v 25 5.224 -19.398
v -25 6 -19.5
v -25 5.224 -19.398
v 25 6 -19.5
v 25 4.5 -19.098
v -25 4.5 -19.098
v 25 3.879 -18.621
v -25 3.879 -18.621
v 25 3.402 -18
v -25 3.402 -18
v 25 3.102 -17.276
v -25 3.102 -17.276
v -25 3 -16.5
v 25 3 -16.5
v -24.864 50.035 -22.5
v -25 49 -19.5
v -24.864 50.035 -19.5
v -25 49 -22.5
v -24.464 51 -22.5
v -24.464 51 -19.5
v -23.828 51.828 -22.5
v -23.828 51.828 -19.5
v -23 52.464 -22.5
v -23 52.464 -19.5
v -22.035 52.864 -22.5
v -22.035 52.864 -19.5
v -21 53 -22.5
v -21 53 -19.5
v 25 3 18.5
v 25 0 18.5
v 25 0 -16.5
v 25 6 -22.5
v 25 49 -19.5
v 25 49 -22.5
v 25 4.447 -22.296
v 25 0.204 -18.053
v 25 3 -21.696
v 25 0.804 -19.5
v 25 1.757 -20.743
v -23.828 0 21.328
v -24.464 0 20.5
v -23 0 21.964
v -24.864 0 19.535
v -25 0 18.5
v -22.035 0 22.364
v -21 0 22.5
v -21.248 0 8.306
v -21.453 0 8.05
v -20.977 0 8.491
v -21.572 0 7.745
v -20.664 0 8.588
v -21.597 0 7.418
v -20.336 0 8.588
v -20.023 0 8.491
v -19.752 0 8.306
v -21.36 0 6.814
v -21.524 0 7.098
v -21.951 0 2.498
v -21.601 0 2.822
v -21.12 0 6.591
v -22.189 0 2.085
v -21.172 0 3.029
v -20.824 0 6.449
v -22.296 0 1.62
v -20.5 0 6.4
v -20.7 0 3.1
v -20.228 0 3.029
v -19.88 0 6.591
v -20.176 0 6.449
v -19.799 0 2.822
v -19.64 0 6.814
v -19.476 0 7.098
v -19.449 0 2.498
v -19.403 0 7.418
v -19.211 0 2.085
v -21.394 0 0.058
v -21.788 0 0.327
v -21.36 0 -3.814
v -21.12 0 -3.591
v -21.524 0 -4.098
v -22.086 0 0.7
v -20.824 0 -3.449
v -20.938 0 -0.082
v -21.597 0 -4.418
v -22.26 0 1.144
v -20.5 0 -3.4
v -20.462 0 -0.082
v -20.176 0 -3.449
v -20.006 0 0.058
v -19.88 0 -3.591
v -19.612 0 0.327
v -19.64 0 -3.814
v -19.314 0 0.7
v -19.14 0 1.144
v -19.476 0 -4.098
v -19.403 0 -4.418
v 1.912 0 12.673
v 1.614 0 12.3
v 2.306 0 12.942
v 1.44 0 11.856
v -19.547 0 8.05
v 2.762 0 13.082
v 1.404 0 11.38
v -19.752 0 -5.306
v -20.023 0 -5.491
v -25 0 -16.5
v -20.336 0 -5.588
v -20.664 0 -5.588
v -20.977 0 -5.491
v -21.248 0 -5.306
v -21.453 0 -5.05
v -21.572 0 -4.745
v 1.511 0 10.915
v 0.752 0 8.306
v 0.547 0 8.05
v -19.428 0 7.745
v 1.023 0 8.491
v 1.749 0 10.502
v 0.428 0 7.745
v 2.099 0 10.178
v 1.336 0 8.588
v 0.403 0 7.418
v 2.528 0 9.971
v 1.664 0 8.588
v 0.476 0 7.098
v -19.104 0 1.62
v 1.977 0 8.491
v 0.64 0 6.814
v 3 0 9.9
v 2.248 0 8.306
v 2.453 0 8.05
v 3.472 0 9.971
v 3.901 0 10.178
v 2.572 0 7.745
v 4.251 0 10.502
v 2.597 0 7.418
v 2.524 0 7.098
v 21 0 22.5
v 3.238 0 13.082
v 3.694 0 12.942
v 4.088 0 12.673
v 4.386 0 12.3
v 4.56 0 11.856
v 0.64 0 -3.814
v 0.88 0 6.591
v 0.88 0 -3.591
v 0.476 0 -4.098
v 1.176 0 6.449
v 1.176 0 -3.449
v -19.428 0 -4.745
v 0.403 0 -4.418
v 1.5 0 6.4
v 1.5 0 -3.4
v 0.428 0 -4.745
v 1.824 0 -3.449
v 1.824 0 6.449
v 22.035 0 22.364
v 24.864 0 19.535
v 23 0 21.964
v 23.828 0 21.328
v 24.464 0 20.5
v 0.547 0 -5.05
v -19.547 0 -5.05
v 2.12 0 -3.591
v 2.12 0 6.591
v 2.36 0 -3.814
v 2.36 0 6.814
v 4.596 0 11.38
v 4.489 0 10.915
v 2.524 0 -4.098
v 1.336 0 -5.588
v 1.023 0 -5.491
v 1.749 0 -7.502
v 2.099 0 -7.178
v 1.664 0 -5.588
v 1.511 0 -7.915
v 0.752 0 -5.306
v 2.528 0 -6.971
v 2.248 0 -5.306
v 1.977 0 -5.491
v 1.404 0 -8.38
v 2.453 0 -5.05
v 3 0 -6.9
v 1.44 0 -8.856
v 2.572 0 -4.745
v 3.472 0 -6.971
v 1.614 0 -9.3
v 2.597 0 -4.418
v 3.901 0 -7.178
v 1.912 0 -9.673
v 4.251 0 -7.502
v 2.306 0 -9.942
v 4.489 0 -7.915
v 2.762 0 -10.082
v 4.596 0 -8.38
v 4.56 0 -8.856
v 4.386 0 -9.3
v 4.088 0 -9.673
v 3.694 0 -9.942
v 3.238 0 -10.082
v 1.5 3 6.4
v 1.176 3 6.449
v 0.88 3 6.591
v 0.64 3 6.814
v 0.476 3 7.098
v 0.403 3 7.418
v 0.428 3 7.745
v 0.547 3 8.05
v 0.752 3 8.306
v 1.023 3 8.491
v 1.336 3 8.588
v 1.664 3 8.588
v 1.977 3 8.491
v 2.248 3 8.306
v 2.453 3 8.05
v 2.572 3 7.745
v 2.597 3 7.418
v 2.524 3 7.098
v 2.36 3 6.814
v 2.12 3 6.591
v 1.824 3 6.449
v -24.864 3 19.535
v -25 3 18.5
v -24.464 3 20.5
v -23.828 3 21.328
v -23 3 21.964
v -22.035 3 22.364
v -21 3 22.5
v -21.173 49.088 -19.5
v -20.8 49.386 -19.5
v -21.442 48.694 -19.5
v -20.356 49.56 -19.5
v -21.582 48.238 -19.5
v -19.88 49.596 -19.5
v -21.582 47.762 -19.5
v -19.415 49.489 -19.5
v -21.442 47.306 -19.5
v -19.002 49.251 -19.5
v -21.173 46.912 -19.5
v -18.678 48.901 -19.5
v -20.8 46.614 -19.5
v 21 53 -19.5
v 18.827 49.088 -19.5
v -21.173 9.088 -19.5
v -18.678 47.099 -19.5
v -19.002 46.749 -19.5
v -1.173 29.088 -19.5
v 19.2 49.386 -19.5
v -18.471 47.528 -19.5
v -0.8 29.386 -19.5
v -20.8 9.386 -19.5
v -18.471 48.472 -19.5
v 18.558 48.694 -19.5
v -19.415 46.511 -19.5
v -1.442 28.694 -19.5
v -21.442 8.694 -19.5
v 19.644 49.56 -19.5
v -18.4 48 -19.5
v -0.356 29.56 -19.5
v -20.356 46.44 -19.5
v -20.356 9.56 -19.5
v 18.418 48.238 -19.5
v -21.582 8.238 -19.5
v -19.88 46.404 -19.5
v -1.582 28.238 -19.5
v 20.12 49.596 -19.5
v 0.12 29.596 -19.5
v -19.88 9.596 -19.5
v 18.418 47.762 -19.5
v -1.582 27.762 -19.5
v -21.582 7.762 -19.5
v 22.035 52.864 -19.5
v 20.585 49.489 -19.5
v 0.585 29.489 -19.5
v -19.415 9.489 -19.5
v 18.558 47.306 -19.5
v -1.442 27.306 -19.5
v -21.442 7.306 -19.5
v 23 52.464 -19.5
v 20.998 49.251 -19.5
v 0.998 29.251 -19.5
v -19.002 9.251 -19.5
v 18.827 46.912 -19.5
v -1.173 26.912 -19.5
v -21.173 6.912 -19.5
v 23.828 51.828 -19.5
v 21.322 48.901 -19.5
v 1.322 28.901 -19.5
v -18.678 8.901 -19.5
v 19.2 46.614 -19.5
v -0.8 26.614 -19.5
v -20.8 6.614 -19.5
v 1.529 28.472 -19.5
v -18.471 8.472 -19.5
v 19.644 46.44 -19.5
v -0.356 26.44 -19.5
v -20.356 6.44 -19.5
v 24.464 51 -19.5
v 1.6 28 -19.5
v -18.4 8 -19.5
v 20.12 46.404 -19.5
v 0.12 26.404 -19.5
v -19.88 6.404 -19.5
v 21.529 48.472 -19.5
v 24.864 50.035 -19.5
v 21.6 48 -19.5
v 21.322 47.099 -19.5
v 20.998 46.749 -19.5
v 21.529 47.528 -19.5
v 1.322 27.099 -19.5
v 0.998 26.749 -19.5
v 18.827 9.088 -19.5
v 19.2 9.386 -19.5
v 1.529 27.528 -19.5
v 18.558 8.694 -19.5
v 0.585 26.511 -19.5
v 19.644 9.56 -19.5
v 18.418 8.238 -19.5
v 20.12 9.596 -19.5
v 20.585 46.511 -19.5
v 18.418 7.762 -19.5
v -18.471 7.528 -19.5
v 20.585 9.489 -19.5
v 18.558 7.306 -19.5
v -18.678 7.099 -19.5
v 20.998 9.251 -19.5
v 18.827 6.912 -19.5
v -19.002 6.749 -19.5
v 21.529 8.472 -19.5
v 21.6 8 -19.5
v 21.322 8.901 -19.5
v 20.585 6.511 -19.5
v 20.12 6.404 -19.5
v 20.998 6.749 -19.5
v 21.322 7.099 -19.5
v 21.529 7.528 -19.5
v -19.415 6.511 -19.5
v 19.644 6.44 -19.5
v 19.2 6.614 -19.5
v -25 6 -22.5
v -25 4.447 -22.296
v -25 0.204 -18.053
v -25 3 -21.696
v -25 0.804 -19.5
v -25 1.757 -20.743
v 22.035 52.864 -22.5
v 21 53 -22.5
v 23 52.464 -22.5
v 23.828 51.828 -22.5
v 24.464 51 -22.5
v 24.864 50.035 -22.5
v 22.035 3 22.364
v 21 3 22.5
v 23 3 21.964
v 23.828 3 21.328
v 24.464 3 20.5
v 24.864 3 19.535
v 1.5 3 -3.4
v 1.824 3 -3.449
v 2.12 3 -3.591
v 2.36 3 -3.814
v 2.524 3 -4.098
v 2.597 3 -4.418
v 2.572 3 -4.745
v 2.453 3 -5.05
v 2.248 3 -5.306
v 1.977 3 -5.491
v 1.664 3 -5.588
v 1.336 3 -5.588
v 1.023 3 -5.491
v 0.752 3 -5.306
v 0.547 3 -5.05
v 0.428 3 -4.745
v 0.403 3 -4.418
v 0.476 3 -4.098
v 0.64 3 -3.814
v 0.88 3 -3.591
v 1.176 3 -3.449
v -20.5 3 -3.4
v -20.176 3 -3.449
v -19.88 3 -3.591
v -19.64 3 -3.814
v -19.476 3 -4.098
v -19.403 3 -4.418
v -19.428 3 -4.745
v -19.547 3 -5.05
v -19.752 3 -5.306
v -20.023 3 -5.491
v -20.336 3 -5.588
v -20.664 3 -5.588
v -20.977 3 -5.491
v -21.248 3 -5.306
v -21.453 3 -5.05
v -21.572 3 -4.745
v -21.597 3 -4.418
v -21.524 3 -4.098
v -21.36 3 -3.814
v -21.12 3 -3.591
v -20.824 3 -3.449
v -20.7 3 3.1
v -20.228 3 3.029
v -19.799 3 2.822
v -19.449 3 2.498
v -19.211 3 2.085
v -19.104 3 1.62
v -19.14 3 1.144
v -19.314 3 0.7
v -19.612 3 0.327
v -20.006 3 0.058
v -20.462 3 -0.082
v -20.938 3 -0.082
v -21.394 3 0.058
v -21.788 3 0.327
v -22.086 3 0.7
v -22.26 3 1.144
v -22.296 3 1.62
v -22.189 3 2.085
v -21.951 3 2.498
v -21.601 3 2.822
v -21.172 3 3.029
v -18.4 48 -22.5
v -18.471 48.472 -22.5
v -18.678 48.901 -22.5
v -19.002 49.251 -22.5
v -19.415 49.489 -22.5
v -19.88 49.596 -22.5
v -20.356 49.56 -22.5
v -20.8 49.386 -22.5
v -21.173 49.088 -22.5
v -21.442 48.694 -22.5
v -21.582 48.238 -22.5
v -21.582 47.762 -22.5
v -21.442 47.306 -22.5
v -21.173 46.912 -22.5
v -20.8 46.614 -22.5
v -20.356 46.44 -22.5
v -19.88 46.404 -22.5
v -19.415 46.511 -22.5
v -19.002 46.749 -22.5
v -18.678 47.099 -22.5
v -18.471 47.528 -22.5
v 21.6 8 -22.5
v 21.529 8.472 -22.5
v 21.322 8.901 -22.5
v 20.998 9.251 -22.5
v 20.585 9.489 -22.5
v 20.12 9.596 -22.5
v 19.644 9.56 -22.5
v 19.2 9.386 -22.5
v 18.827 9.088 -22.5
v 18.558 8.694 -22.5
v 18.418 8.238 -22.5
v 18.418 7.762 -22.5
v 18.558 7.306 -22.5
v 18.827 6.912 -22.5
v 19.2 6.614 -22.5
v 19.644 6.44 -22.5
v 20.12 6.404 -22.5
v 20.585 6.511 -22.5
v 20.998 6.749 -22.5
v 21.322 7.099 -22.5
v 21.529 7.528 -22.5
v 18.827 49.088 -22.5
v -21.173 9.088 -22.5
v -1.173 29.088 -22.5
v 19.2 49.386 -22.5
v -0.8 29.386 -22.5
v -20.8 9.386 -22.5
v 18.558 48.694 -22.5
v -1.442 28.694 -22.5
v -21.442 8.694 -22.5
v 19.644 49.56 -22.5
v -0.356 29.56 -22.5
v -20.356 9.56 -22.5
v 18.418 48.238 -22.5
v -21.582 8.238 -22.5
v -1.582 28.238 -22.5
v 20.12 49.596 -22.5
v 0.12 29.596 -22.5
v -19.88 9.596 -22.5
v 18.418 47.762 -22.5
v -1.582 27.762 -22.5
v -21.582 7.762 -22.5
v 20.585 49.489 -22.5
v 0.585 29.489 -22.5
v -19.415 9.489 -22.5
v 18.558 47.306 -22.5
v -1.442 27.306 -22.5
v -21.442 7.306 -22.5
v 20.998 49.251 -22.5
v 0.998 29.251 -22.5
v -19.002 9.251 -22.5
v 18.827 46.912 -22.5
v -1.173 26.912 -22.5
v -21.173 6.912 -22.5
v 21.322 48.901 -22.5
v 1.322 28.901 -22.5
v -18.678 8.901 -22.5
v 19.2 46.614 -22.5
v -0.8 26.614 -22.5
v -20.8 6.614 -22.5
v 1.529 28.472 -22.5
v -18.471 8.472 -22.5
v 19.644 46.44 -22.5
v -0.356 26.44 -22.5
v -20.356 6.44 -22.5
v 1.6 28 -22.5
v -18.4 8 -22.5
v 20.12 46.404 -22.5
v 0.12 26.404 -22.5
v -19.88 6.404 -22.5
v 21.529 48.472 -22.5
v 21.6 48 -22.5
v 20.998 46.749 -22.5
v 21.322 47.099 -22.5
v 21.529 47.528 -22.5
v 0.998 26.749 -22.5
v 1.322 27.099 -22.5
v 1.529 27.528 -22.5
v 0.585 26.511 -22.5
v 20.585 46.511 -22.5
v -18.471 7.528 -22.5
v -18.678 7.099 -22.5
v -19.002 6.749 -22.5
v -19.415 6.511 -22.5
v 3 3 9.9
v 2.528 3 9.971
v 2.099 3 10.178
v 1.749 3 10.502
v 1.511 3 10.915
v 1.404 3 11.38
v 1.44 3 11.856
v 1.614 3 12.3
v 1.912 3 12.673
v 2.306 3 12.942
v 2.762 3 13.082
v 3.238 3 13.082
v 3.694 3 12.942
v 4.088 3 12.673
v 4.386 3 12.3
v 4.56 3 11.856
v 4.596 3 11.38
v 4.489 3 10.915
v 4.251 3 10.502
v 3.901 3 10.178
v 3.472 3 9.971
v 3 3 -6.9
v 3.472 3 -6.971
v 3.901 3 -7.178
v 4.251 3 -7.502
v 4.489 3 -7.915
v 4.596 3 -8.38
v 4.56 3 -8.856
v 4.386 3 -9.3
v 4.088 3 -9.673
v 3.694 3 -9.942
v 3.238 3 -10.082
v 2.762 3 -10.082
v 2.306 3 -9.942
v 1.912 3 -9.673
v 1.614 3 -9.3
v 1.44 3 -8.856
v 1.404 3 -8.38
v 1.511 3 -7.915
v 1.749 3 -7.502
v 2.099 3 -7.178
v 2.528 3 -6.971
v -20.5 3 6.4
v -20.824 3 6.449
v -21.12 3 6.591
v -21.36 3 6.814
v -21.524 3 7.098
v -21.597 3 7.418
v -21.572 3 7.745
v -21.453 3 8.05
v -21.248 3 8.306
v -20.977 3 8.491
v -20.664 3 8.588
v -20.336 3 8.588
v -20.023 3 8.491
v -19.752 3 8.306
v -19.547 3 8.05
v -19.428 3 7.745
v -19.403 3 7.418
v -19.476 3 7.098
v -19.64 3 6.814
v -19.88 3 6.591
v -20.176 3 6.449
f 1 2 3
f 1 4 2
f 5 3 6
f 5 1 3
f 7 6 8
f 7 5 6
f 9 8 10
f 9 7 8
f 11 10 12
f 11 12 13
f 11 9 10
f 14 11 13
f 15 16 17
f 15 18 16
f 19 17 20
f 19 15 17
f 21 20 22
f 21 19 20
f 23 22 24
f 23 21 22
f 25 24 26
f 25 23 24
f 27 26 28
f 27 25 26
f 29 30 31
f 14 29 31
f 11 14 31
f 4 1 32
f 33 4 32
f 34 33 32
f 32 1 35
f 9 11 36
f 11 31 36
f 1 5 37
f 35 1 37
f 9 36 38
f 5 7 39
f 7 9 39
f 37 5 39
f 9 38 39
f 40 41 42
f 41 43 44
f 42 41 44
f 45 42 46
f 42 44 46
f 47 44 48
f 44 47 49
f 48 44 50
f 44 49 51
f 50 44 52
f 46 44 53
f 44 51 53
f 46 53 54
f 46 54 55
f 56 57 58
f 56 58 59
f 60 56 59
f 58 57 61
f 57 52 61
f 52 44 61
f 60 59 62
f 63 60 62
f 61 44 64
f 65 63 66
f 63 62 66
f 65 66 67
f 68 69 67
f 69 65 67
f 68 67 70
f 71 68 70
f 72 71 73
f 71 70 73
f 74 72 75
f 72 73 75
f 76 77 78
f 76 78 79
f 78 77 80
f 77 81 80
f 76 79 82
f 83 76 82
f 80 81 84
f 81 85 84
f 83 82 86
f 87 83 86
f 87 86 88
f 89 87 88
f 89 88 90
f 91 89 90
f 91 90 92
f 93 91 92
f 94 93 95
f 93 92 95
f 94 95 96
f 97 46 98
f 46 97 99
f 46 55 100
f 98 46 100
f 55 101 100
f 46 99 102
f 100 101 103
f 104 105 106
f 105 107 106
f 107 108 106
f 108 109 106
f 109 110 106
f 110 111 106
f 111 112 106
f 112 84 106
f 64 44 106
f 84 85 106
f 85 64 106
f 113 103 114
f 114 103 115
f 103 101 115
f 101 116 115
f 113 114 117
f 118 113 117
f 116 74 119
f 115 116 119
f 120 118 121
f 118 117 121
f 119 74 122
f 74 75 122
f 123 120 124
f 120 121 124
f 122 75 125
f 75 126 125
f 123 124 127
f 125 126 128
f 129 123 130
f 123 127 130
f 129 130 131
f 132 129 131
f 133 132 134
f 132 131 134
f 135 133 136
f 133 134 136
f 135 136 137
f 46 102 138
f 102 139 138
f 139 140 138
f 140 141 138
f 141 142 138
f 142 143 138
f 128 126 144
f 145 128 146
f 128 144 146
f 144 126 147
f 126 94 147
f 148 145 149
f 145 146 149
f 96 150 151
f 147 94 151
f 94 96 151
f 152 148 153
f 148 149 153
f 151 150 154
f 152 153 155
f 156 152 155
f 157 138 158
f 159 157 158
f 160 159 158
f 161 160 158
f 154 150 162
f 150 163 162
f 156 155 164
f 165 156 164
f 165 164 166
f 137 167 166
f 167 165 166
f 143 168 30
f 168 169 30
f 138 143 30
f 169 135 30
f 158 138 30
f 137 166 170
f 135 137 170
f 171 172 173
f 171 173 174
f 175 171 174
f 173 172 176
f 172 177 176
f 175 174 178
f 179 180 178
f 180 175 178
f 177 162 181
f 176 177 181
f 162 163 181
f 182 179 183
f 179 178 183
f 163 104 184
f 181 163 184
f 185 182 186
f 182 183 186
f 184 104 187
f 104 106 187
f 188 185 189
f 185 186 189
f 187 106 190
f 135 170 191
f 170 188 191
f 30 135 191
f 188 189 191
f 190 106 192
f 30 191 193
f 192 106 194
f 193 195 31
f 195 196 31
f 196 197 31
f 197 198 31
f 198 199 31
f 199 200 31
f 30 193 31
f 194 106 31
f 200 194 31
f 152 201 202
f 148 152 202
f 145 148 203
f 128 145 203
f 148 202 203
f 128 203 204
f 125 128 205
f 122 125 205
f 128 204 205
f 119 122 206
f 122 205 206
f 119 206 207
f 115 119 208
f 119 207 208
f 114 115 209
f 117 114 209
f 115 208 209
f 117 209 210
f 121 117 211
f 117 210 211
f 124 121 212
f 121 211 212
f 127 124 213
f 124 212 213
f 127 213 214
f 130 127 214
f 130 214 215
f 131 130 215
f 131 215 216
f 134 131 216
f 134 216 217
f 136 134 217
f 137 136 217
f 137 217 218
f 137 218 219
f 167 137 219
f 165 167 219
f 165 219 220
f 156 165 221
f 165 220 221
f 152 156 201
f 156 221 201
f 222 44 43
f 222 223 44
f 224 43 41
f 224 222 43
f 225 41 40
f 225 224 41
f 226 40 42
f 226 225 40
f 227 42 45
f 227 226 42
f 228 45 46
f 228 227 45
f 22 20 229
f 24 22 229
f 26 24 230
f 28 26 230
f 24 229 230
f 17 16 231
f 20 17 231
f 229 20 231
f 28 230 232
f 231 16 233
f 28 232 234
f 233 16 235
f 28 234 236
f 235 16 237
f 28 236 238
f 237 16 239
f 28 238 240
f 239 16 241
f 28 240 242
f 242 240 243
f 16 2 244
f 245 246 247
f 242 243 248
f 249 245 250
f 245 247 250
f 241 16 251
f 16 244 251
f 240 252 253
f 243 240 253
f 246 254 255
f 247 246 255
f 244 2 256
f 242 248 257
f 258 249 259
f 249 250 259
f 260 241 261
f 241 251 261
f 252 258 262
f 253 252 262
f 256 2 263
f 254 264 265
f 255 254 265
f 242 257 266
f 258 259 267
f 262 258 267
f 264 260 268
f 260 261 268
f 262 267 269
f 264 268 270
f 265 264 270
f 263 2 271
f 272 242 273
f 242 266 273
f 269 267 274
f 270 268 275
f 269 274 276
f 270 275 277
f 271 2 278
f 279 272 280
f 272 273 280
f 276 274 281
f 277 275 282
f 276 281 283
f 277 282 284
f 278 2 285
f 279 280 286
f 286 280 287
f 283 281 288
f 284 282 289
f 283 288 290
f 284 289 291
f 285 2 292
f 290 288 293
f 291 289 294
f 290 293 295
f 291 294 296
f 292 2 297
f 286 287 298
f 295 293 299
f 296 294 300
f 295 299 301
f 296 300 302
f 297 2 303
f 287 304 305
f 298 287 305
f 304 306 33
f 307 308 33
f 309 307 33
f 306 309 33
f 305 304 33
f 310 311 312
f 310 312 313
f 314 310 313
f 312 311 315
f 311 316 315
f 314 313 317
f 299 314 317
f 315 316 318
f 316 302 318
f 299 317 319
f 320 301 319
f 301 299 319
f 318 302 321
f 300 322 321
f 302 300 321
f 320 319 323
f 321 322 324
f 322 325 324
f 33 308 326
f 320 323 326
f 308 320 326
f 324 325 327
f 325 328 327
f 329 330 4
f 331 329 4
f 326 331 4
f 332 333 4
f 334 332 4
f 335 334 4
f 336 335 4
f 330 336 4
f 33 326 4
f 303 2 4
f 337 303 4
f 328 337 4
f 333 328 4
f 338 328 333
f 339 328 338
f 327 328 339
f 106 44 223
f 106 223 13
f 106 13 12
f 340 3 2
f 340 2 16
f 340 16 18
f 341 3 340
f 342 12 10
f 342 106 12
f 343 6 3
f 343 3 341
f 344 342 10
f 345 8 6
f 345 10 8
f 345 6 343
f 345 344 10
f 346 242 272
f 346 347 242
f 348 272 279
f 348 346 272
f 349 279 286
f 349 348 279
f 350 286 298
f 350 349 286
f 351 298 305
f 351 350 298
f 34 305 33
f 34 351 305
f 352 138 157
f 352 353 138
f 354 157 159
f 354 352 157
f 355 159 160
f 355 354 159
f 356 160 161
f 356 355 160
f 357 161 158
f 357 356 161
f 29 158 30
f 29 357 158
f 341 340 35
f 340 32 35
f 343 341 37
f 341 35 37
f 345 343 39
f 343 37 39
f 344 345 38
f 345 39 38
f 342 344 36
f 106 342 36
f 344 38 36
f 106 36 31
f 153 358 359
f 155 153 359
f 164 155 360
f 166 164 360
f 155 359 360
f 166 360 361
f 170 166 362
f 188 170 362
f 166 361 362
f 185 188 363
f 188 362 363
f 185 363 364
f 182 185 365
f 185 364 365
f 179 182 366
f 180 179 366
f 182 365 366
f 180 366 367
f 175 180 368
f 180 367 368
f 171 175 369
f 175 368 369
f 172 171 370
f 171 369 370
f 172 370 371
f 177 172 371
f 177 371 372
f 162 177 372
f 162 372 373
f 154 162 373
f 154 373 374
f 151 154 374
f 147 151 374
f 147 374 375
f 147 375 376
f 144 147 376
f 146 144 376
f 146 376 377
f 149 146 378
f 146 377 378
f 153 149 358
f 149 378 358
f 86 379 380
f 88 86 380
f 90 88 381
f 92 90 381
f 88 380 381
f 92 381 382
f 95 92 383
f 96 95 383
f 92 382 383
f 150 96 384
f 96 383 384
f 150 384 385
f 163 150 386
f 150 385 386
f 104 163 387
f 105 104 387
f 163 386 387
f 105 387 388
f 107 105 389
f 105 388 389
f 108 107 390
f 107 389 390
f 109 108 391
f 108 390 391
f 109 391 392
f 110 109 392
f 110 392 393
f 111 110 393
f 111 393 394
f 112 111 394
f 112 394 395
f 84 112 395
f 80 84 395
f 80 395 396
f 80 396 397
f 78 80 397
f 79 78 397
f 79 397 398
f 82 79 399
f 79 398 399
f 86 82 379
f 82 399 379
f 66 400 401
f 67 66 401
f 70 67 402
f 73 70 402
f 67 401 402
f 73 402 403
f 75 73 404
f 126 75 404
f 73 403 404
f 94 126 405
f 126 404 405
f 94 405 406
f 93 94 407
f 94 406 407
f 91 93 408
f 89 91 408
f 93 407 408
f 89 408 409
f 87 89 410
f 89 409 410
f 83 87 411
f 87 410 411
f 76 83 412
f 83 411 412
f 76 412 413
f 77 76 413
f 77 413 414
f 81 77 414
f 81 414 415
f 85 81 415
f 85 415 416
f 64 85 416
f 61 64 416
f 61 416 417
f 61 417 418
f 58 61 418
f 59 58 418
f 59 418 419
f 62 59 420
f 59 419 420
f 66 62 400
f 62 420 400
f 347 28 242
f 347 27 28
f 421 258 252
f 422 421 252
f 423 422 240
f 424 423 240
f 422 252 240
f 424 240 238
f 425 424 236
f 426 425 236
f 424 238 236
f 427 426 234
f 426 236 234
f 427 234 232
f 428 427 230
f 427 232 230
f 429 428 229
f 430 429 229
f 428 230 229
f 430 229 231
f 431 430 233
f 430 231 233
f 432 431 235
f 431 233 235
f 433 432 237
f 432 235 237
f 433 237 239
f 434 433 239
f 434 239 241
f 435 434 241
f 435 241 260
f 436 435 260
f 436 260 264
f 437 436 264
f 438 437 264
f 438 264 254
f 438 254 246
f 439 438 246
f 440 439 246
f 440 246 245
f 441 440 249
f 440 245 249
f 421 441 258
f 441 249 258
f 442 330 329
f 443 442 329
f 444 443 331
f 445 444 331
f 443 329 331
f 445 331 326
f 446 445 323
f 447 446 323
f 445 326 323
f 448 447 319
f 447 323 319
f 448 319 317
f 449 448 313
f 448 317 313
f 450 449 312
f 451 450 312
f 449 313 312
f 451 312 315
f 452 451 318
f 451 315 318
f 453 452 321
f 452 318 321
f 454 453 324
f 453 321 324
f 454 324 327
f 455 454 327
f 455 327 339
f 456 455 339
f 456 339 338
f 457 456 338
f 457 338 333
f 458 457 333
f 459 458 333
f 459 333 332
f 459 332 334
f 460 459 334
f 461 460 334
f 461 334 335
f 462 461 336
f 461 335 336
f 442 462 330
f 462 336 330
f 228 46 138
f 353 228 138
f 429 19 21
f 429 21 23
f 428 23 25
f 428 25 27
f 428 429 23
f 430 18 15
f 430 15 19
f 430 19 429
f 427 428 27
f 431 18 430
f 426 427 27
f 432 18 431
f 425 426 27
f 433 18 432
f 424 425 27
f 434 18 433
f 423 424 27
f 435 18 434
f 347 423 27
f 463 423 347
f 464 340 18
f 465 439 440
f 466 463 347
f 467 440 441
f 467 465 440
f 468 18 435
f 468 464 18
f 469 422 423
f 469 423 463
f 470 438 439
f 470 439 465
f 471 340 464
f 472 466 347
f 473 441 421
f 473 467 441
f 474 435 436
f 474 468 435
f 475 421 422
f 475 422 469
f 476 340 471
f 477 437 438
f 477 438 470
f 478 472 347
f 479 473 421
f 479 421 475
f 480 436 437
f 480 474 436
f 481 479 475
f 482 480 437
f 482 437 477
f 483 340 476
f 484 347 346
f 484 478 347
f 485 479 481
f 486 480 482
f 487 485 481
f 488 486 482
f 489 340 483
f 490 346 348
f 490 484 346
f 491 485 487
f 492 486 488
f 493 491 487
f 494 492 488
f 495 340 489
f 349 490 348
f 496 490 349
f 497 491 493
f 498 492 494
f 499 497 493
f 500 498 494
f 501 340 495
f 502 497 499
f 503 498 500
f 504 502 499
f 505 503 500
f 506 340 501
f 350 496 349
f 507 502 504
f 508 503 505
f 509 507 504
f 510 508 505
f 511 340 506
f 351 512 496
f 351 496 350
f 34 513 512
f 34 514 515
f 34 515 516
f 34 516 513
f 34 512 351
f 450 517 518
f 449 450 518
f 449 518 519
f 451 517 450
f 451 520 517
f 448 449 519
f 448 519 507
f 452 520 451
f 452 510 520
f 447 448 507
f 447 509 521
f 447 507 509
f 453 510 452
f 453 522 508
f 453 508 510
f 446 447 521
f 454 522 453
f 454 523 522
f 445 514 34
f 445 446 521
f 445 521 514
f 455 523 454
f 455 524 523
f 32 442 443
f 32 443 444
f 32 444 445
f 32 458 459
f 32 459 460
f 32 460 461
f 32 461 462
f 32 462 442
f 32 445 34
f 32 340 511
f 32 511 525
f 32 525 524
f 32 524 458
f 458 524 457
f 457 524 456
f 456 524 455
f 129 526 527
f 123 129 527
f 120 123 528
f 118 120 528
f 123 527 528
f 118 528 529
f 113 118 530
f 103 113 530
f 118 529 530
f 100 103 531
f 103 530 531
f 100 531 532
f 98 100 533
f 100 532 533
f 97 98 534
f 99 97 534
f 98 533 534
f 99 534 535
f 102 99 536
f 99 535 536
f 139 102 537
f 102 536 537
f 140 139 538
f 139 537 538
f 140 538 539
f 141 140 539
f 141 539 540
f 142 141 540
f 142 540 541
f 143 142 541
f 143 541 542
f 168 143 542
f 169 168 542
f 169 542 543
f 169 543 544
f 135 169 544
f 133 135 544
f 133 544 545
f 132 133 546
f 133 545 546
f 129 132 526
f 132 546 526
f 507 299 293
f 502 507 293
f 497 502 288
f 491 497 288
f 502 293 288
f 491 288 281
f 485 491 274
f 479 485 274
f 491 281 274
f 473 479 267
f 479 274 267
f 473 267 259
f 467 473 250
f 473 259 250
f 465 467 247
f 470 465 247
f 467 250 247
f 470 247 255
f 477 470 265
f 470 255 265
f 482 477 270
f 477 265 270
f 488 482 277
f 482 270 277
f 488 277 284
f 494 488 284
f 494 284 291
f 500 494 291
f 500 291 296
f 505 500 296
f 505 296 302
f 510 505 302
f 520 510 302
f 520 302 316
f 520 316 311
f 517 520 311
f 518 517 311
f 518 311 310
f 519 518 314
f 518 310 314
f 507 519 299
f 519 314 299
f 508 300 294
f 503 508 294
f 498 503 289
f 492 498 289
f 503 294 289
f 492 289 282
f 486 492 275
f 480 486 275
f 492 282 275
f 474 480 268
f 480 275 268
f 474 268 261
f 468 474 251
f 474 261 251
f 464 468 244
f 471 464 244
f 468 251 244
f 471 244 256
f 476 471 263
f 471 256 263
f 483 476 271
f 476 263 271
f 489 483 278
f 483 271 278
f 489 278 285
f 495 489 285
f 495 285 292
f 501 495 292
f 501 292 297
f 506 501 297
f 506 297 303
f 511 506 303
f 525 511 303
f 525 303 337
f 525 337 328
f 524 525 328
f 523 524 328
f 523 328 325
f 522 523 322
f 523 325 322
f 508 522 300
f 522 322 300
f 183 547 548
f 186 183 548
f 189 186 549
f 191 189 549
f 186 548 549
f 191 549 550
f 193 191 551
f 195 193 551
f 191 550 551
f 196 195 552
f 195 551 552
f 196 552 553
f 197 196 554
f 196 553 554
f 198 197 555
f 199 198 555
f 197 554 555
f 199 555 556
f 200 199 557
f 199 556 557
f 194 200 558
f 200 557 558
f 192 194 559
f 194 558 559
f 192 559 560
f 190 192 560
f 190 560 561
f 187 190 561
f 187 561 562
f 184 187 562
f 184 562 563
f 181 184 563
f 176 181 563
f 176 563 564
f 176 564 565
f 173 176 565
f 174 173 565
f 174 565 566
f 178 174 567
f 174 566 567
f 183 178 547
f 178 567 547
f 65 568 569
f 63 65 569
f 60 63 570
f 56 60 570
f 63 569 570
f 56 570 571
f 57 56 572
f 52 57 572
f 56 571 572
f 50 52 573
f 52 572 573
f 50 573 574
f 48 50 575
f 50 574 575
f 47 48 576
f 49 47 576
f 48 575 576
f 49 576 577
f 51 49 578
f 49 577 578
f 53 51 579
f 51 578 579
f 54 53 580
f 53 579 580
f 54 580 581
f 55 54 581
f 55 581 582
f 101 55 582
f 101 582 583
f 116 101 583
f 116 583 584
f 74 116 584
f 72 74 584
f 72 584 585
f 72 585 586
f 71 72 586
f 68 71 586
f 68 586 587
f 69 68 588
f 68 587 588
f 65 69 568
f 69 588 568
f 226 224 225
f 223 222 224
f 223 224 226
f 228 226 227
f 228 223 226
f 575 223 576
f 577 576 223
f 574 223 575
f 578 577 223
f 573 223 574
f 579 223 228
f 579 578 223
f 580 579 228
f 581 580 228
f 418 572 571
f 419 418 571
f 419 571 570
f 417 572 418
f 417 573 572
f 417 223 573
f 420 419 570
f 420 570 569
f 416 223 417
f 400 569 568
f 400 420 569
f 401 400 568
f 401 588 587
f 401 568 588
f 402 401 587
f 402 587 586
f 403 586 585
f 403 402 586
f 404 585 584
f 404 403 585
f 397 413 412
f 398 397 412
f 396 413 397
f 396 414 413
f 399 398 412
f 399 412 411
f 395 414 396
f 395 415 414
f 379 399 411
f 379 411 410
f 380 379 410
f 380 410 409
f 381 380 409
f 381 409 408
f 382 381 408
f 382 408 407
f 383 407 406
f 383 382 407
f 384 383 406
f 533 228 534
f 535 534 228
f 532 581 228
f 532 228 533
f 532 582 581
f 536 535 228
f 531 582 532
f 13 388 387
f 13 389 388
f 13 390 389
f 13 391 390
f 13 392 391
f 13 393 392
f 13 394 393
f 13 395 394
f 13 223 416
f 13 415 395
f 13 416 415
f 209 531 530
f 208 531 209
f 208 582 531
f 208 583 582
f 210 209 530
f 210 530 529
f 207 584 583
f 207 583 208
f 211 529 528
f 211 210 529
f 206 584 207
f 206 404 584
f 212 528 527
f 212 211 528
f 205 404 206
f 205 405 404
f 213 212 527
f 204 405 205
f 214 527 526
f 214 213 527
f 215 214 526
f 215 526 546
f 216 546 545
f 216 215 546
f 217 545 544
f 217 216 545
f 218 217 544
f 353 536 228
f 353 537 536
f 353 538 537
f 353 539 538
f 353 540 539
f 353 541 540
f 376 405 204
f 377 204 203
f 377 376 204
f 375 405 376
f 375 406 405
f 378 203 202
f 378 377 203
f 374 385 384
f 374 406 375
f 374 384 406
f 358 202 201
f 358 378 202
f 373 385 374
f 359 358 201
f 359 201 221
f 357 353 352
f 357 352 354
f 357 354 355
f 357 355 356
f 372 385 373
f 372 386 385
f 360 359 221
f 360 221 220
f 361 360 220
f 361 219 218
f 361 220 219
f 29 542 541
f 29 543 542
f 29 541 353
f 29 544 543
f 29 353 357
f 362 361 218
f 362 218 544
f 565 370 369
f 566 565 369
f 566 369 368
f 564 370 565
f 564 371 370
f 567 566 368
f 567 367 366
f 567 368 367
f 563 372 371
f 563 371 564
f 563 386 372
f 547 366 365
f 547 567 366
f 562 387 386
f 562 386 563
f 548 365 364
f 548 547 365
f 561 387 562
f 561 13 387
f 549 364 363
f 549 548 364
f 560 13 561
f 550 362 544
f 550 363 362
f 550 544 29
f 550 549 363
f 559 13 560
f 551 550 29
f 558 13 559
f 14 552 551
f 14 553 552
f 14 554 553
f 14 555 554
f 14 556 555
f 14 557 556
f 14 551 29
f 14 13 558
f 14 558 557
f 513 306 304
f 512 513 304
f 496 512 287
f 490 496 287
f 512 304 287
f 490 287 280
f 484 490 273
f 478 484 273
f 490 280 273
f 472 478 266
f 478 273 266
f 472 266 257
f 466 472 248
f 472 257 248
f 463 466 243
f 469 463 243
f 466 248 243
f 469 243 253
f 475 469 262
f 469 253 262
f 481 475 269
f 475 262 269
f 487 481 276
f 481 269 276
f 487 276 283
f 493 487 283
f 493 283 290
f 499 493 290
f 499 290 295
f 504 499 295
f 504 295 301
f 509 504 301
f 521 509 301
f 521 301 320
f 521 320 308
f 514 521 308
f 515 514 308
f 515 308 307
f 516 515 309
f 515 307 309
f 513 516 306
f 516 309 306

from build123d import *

# Parameters (mm, degrees)
SKETCH1_W           = 50
SKETCH1_H           = 45
BOSS_EXTRUDE1_DEPTH = 3
SKETCH2_W           = 50
SKETCH2_H           = 3
BOSS_EXTRUDE2_DEPTH = 50
SKETCH3_R           = 1.6
SKETCH3_R_2         = 1.1
CUT_EXTRUDE1_DEPTH  = 3
SKETCH4_R           = 1.6
CUT_EXTRUDE2_DEPTH  = 3
FILLET1_R           = 4
FILLET2_R           = 3
FILLET3_R           = 6


with BuildPart() as part:
    # Sketch1 → Boss-Extrude1 (new body)
    with BuildSketch(Plane(origin=(0, 0, 0), x_dir=(1, 0, 0), z_dir=(0, 1, 0))):
        Rectangle(SKETCH1_W, SKETCH1_H)
    extrude(amount=BOSS_EXTRUDE1_DEPTH)

    # Sketch2 → Boss-Extrude2 (add)
    with BuildSketch(Plane(origin=(0, 3, 0), x_dir=(1, 0, 0), z_dir=(0, 1, 0))):
        with Locations((0, 21)):
            Rectangle(SKETCH2_W, SKETCH2_H)
    extrude(amount=BOSS_EXTRUDE2_DEPTH)

    # Sketch3 → Cut-Extrude1 (cut)
    with BuildSketch(Plane(origin=(0, 3, 0), x_dir=(1, 0, 0), z_dir=(0, 1, 0))):
        with Locations(Location((3, 8.5, 0), (0, 0, 270))):
            Circle(SKETCH3_R)
        with Locations(Location((3, -11.5, 0), (0, 0, 90))):
            Circle(SKETCH3_R)
        with Locations(Location((-20.7, -1.5, 0), (0, 0, 270))):
            Circle(SKETCH3_R)
        with Locations(Location((1.5, 4.5, 0), (0, 0, 270))):
            Circle(SKETCH3_R_2)
        with Locations(Location((1.5, -7.5, 0), (0, 0, 90))):
            Circle(SKETCH3_R_2)
        with Locations(Location((-20.5, 4.5, 0), (0, 0, 270))):
            Circle(SKETCH3_R_2)
        with Locations(Location((-20.5, -7.5, 0), (0, 0, 90))):
            Circle(SKETCH3_R_2)
    extrude(amount=-CUT_EXTRUDE1_DEPTH, mode=Mode.SUBTRACT)

    # Sketch4 → Cut-Extrude2 (cut)
    with BuildSketch(Plane.XY.offset(-19.5)):
        with Locations((-20, 48)):
            Circle(SKETCH4_R)
        with Locations((20, 48)):
            Circle(SKETCH4_R)
        with Locations((20, 8)):
            Circle(SKETCH4_R)
        with Locations((-20, 8)):
            Circle(SKETCH4_R)
        with Locations((0, 28)):
            Circle(SKETCH4_R)
    extrude(amount=-CUT_EXTRUDE2_DEPTH, mode=Mode.SUBTRACT)

    # Fillet1
    fillet1_edges = [part.edges().sort_by_distance(p)[0] for p in [
        (-25, 53, -21),
        (25, 53, -21),
        (25, 1.5, 22.5),
        (-25, 1.5, 22.5),
    ]]
    fillet(fillet1_edges, radius=FILLET1_R)

    # Fillet2
    fillet2_edges = [part.edges().sort_by_distance(p)[0] for p in [
        (0, 3, -19.5),
    ]]
    fillet(fillet2_edges, radius=FILLET2_R)

    # Fillet3
    fillet3_edges = [part.edges().sort_by_distance(p)[0] for p in [
        (0, 0, -22.5),
    ]]
    fillet(fillet3_edges, radius=FILLET3_R)


solid = part.part
